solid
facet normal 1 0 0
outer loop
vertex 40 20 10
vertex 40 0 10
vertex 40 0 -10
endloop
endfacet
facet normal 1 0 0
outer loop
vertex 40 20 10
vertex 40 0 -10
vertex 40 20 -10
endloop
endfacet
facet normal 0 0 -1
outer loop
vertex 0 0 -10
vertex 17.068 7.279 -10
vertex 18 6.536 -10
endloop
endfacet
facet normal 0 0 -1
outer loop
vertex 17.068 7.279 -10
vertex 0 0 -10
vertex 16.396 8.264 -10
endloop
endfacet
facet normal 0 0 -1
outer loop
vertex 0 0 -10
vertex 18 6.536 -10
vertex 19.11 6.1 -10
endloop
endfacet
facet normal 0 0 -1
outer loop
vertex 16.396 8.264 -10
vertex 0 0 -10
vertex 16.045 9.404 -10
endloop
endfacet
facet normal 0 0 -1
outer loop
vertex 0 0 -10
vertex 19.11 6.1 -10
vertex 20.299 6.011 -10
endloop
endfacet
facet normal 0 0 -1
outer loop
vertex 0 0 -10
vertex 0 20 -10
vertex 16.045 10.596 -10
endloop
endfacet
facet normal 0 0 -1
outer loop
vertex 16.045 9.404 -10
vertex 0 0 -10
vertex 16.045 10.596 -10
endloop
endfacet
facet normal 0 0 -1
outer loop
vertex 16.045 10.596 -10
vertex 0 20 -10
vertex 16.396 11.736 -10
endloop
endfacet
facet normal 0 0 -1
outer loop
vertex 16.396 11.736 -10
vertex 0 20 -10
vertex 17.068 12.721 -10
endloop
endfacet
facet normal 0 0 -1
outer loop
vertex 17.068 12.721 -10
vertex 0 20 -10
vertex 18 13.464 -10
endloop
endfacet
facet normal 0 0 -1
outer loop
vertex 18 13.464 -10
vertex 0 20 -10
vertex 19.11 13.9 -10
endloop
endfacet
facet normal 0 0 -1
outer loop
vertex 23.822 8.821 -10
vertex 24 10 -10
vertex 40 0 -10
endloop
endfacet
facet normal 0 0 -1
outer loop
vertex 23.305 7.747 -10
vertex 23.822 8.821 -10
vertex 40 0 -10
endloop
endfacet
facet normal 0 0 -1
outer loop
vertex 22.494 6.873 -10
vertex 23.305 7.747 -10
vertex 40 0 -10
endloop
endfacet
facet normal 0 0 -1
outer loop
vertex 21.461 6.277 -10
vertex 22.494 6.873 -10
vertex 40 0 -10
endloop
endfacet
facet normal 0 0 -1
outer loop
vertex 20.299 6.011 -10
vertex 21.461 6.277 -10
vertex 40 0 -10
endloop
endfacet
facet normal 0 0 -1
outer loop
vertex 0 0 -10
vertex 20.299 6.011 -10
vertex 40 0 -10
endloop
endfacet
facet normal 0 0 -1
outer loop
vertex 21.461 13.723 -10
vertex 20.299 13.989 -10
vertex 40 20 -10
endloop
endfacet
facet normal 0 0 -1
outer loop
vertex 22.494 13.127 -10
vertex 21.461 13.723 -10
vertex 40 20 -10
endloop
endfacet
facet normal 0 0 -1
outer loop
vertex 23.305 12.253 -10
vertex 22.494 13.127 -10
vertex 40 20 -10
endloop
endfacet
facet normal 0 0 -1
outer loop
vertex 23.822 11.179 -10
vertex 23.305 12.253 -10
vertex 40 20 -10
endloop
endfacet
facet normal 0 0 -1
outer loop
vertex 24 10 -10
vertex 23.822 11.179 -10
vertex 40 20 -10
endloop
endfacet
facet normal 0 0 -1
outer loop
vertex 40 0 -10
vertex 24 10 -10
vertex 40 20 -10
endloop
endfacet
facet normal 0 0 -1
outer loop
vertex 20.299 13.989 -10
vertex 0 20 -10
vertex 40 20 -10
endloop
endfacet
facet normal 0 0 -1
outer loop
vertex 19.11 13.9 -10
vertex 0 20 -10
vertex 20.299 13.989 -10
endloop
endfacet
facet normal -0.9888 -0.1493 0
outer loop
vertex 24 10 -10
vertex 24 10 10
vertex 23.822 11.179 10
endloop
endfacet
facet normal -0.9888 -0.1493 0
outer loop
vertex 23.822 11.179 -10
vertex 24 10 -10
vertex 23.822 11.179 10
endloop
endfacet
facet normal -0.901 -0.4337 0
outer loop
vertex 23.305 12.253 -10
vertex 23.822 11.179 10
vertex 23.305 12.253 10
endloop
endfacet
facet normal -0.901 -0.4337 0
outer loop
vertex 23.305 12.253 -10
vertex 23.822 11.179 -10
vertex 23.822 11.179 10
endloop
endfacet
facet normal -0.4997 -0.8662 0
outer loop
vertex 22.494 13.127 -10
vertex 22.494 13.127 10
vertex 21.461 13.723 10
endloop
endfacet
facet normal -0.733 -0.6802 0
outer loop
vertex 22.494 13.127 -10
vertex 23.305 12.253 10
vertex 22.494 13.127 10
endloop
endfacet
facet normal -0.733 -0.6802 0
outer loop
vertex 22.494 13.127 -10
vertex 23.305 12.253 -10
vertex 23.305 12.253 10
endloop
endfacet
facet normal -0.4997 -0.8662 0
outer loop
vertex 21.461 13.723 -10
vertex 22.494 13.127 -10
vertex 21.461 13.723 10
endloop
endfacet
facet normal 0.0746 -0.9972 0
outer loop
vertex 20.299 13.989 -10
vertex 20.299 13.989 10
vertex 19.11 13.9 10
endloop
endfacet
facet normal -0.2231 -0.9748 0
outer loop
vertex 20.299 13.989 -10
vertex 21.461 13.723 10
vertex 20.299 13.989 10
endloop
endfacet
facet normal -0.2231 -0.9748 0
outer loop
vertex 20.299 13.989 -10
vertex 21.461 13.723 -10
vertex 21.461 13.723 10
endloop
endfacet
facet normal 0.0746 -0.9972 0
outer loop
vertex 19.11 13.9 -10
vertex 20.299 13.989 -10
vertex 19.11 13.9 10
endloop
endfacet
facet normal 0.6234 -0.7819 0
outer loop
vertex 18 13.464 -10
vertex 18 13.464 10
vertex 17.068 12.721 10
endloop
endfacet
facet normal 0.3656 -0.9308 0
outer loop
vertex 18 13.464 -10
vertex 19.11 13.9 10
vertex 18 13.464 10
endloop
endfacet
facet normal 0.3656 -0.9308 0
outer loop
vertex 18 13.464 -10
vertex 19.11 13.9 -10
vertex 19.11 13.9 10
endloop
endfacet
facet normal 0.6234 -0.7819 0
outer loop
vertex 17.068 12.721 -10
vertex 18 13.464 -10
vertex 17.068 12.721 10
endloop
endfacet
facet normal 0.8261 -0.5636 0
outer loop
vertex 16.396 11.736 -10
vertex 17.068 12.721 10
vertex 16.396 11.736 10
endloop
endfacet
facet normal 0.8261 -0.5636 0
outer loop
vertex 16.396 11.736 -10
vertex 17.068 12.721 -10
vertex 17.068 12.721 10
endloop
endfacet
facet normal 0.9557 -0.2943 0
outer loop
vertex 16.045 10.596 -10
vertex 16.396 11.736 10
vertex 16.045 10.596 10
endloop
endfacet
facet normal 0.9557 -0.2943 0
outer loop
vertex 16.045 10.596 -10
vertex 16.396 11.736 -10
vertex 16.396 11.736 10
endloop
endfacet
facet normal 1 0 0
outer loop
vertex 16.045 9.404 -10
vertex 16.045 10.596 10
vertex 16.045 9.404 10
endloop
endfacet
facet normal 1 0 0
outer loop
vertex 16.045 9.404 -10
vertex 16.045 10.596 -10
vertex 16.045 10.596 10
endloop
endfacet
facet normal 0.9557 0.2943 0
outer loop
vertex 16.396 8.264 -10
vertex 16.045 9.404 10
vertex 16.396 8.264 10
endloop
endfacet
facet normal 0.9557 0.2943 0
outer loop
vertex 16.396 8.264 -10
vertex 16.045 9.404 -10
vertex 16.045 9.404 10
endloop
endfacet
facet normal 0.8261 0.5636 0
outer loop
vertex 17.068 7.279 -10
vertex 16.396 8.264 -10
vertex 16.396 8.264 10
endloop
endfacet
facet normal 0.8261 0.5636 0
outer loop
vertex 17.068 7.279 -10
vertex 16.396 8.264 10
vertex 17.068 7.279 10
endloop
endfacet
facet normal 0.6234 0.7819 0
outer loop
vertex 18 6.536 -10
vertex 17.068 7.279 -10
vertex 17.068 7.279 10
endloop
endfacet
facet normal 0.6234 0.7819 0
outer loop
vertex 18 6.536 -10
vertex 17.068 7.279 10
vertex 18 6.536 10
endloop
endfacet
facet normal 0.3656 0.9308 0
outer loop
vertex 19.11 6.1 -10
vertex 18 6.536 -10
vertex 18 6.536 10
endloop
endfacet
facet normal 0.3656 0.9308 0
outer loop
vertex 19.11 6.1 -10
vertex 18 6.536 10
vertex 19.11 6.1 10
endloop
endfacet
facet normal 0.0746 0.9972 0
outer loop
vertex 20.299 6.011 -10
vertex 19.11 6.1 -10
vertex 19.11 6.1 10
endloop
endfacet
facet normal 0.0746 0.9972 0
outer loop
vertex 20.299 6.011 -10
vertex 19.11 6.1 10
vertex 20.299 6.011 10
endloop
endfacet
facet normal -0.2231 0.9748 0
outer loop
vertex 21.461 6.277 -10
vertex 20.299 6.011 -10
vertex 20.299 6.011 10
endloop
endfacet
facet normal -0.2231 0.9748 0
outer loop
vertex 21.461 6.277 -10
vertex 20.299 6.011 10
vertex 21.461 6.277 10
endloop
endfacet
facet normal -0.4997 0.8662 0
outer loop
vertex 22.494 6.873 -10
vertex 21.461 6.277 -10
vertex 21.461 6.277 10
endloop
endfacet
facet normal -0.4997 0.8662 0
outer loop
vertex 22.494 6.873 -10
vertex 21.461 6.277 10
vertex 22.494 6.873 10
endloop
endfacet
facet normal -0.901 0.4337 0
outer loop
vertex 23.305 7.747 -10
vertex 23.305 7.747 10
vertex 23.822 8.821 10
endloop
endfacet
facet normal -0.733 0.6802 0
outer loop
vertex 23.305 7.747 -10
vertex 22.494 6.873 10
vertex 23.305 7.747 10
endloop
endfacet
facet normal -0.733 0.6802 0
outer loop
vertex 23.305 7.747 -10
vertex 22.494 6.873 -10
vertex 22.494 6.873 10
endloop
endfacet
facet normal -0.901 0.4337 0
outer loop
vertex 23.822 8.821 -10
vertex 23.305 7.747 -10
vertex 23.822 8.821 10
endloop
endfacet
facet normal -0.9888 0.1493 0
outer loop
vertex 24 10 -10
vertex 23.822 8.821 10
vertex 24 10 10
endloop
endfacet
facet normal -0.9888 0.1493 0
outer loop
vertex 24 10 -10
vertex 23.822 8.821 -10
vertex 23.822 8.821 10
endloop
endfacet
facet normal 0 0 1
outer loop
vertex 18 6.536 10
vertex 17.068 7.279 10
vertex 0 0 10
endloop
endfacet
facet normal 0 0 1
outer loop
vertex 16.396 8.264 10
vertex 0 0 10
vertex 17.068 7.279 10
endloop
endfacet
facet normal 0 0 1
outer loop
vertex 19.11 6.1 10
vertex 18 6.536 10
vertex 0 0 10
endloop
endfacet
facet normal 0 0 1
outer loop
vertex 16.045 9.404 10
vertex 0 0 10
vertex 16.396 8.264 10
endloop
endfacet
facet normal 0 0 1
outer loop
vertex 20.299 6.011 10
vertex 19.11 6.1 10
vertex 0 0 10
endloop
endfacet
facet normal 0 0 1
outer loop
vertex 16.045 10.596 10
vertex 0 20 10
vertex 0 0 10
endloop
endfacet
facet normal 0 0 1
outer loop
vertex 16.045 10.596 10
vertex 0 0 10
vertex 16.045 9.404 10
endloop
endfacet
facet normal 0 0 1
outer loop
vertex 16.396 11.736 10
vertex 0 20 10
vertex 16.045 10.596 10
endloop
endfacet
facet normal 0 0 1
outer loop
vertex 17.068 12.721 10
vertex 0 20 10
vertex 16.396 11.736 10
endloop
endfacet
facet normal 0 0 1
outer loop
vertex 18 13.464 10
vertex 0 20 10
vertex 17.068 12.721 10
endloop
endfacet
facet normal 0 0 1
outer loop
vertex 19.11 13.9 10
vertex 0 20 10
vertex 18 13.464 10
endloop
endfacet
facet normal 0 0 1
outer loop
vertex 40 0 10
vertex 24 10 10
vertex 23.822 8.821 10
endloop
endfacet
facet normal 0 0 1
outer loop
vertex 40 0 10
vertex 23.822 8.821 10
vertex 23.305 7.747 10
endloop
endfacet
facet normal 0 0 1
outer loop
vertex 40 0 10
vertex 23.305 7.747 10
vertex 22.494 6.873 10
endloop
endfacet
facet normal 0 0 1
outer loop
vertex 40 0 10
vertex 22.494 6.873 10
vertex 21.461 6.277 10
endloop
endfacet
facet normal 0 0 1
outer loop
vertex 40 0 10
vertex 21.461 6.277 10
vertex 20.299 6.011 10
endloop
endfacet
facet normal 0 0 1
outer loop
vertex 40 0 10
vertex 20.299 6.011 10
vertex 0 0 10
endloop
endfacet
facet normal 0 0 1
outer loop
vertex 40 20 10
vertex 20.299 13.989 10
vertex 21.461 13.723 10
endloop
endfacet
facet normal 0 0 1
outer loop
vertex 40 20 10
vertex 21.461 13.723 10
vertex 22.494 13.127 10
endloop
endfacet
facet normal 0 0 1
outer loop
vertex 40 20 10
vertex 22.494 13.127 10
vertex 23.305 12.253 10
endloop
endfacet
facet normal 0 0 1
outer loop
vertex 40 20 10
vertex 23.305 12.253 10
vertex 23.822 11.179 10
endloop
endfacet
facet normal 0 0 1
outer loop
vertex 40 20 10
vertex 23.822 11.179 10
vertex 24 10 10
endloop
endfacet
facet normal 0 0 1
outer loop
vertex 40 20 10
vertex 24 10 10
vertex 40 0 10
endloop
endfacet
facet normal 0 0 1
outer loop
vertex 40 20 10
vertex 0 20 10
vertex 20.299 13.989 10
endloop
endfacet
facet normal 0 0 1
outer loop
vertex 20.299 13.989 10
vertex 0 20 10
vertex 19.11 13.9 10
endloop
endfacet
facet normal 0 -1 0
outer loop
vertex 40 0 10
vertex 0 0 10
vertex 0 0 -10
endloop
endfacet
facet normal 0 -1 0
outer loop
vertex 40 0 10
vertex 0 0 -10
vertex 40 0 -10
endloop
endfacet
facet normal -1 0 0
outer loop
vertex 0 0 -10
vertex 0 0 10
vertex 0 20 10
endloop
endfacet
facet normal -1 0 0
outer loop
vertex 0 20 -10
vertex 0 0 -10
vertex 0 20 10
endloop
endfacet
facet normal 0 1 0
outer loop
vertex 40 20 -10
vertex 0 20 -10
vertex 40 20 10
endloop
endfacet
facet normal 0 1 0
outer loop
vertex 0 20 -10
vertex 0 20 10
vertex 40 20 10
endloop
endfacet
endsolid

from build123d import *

# Parameters (mm, degrees)
SKETCH1_W               = 40
SKETCH1_H               = 20
BOSS_EXTRUDE1_DEPTH     = 10
CUT_EXTRUDE1_DEPTH      = 46.82575695
CUT_EXTRUDE1_DEPTH_BACK = 46.82575695
SKETCH2_R               = 4


with BuildPart() as part:
    # Sketch1 → Boss-Extrude1 (new, symmetric)
    with BuildSketch(Plane.XY):
        with Locations((20, 10)):
            Rectangle(SKETCH1_W, SKETCH1_H)
    extrude(amount=BOSS_EXTRUDE1_DEPTH, both=True)

    # Sketch2 → Cut-Extrude1 (cut, two sides: drawn at the far end of the back side and taken through both)
    with BuildSketch(Plane.XY.offset(-CUT_EXTRUDE1_DEPTH_BACK)):
        with Locations((20, 10)):
            Circle(SKETCH2_R)
    extrude(amount=CUT_EXTRUDE1_DEPTH + CUT_EXTRUDE1_DEPTH_BACK, mode=Mode.SUBTRACT)


solid = part.part
